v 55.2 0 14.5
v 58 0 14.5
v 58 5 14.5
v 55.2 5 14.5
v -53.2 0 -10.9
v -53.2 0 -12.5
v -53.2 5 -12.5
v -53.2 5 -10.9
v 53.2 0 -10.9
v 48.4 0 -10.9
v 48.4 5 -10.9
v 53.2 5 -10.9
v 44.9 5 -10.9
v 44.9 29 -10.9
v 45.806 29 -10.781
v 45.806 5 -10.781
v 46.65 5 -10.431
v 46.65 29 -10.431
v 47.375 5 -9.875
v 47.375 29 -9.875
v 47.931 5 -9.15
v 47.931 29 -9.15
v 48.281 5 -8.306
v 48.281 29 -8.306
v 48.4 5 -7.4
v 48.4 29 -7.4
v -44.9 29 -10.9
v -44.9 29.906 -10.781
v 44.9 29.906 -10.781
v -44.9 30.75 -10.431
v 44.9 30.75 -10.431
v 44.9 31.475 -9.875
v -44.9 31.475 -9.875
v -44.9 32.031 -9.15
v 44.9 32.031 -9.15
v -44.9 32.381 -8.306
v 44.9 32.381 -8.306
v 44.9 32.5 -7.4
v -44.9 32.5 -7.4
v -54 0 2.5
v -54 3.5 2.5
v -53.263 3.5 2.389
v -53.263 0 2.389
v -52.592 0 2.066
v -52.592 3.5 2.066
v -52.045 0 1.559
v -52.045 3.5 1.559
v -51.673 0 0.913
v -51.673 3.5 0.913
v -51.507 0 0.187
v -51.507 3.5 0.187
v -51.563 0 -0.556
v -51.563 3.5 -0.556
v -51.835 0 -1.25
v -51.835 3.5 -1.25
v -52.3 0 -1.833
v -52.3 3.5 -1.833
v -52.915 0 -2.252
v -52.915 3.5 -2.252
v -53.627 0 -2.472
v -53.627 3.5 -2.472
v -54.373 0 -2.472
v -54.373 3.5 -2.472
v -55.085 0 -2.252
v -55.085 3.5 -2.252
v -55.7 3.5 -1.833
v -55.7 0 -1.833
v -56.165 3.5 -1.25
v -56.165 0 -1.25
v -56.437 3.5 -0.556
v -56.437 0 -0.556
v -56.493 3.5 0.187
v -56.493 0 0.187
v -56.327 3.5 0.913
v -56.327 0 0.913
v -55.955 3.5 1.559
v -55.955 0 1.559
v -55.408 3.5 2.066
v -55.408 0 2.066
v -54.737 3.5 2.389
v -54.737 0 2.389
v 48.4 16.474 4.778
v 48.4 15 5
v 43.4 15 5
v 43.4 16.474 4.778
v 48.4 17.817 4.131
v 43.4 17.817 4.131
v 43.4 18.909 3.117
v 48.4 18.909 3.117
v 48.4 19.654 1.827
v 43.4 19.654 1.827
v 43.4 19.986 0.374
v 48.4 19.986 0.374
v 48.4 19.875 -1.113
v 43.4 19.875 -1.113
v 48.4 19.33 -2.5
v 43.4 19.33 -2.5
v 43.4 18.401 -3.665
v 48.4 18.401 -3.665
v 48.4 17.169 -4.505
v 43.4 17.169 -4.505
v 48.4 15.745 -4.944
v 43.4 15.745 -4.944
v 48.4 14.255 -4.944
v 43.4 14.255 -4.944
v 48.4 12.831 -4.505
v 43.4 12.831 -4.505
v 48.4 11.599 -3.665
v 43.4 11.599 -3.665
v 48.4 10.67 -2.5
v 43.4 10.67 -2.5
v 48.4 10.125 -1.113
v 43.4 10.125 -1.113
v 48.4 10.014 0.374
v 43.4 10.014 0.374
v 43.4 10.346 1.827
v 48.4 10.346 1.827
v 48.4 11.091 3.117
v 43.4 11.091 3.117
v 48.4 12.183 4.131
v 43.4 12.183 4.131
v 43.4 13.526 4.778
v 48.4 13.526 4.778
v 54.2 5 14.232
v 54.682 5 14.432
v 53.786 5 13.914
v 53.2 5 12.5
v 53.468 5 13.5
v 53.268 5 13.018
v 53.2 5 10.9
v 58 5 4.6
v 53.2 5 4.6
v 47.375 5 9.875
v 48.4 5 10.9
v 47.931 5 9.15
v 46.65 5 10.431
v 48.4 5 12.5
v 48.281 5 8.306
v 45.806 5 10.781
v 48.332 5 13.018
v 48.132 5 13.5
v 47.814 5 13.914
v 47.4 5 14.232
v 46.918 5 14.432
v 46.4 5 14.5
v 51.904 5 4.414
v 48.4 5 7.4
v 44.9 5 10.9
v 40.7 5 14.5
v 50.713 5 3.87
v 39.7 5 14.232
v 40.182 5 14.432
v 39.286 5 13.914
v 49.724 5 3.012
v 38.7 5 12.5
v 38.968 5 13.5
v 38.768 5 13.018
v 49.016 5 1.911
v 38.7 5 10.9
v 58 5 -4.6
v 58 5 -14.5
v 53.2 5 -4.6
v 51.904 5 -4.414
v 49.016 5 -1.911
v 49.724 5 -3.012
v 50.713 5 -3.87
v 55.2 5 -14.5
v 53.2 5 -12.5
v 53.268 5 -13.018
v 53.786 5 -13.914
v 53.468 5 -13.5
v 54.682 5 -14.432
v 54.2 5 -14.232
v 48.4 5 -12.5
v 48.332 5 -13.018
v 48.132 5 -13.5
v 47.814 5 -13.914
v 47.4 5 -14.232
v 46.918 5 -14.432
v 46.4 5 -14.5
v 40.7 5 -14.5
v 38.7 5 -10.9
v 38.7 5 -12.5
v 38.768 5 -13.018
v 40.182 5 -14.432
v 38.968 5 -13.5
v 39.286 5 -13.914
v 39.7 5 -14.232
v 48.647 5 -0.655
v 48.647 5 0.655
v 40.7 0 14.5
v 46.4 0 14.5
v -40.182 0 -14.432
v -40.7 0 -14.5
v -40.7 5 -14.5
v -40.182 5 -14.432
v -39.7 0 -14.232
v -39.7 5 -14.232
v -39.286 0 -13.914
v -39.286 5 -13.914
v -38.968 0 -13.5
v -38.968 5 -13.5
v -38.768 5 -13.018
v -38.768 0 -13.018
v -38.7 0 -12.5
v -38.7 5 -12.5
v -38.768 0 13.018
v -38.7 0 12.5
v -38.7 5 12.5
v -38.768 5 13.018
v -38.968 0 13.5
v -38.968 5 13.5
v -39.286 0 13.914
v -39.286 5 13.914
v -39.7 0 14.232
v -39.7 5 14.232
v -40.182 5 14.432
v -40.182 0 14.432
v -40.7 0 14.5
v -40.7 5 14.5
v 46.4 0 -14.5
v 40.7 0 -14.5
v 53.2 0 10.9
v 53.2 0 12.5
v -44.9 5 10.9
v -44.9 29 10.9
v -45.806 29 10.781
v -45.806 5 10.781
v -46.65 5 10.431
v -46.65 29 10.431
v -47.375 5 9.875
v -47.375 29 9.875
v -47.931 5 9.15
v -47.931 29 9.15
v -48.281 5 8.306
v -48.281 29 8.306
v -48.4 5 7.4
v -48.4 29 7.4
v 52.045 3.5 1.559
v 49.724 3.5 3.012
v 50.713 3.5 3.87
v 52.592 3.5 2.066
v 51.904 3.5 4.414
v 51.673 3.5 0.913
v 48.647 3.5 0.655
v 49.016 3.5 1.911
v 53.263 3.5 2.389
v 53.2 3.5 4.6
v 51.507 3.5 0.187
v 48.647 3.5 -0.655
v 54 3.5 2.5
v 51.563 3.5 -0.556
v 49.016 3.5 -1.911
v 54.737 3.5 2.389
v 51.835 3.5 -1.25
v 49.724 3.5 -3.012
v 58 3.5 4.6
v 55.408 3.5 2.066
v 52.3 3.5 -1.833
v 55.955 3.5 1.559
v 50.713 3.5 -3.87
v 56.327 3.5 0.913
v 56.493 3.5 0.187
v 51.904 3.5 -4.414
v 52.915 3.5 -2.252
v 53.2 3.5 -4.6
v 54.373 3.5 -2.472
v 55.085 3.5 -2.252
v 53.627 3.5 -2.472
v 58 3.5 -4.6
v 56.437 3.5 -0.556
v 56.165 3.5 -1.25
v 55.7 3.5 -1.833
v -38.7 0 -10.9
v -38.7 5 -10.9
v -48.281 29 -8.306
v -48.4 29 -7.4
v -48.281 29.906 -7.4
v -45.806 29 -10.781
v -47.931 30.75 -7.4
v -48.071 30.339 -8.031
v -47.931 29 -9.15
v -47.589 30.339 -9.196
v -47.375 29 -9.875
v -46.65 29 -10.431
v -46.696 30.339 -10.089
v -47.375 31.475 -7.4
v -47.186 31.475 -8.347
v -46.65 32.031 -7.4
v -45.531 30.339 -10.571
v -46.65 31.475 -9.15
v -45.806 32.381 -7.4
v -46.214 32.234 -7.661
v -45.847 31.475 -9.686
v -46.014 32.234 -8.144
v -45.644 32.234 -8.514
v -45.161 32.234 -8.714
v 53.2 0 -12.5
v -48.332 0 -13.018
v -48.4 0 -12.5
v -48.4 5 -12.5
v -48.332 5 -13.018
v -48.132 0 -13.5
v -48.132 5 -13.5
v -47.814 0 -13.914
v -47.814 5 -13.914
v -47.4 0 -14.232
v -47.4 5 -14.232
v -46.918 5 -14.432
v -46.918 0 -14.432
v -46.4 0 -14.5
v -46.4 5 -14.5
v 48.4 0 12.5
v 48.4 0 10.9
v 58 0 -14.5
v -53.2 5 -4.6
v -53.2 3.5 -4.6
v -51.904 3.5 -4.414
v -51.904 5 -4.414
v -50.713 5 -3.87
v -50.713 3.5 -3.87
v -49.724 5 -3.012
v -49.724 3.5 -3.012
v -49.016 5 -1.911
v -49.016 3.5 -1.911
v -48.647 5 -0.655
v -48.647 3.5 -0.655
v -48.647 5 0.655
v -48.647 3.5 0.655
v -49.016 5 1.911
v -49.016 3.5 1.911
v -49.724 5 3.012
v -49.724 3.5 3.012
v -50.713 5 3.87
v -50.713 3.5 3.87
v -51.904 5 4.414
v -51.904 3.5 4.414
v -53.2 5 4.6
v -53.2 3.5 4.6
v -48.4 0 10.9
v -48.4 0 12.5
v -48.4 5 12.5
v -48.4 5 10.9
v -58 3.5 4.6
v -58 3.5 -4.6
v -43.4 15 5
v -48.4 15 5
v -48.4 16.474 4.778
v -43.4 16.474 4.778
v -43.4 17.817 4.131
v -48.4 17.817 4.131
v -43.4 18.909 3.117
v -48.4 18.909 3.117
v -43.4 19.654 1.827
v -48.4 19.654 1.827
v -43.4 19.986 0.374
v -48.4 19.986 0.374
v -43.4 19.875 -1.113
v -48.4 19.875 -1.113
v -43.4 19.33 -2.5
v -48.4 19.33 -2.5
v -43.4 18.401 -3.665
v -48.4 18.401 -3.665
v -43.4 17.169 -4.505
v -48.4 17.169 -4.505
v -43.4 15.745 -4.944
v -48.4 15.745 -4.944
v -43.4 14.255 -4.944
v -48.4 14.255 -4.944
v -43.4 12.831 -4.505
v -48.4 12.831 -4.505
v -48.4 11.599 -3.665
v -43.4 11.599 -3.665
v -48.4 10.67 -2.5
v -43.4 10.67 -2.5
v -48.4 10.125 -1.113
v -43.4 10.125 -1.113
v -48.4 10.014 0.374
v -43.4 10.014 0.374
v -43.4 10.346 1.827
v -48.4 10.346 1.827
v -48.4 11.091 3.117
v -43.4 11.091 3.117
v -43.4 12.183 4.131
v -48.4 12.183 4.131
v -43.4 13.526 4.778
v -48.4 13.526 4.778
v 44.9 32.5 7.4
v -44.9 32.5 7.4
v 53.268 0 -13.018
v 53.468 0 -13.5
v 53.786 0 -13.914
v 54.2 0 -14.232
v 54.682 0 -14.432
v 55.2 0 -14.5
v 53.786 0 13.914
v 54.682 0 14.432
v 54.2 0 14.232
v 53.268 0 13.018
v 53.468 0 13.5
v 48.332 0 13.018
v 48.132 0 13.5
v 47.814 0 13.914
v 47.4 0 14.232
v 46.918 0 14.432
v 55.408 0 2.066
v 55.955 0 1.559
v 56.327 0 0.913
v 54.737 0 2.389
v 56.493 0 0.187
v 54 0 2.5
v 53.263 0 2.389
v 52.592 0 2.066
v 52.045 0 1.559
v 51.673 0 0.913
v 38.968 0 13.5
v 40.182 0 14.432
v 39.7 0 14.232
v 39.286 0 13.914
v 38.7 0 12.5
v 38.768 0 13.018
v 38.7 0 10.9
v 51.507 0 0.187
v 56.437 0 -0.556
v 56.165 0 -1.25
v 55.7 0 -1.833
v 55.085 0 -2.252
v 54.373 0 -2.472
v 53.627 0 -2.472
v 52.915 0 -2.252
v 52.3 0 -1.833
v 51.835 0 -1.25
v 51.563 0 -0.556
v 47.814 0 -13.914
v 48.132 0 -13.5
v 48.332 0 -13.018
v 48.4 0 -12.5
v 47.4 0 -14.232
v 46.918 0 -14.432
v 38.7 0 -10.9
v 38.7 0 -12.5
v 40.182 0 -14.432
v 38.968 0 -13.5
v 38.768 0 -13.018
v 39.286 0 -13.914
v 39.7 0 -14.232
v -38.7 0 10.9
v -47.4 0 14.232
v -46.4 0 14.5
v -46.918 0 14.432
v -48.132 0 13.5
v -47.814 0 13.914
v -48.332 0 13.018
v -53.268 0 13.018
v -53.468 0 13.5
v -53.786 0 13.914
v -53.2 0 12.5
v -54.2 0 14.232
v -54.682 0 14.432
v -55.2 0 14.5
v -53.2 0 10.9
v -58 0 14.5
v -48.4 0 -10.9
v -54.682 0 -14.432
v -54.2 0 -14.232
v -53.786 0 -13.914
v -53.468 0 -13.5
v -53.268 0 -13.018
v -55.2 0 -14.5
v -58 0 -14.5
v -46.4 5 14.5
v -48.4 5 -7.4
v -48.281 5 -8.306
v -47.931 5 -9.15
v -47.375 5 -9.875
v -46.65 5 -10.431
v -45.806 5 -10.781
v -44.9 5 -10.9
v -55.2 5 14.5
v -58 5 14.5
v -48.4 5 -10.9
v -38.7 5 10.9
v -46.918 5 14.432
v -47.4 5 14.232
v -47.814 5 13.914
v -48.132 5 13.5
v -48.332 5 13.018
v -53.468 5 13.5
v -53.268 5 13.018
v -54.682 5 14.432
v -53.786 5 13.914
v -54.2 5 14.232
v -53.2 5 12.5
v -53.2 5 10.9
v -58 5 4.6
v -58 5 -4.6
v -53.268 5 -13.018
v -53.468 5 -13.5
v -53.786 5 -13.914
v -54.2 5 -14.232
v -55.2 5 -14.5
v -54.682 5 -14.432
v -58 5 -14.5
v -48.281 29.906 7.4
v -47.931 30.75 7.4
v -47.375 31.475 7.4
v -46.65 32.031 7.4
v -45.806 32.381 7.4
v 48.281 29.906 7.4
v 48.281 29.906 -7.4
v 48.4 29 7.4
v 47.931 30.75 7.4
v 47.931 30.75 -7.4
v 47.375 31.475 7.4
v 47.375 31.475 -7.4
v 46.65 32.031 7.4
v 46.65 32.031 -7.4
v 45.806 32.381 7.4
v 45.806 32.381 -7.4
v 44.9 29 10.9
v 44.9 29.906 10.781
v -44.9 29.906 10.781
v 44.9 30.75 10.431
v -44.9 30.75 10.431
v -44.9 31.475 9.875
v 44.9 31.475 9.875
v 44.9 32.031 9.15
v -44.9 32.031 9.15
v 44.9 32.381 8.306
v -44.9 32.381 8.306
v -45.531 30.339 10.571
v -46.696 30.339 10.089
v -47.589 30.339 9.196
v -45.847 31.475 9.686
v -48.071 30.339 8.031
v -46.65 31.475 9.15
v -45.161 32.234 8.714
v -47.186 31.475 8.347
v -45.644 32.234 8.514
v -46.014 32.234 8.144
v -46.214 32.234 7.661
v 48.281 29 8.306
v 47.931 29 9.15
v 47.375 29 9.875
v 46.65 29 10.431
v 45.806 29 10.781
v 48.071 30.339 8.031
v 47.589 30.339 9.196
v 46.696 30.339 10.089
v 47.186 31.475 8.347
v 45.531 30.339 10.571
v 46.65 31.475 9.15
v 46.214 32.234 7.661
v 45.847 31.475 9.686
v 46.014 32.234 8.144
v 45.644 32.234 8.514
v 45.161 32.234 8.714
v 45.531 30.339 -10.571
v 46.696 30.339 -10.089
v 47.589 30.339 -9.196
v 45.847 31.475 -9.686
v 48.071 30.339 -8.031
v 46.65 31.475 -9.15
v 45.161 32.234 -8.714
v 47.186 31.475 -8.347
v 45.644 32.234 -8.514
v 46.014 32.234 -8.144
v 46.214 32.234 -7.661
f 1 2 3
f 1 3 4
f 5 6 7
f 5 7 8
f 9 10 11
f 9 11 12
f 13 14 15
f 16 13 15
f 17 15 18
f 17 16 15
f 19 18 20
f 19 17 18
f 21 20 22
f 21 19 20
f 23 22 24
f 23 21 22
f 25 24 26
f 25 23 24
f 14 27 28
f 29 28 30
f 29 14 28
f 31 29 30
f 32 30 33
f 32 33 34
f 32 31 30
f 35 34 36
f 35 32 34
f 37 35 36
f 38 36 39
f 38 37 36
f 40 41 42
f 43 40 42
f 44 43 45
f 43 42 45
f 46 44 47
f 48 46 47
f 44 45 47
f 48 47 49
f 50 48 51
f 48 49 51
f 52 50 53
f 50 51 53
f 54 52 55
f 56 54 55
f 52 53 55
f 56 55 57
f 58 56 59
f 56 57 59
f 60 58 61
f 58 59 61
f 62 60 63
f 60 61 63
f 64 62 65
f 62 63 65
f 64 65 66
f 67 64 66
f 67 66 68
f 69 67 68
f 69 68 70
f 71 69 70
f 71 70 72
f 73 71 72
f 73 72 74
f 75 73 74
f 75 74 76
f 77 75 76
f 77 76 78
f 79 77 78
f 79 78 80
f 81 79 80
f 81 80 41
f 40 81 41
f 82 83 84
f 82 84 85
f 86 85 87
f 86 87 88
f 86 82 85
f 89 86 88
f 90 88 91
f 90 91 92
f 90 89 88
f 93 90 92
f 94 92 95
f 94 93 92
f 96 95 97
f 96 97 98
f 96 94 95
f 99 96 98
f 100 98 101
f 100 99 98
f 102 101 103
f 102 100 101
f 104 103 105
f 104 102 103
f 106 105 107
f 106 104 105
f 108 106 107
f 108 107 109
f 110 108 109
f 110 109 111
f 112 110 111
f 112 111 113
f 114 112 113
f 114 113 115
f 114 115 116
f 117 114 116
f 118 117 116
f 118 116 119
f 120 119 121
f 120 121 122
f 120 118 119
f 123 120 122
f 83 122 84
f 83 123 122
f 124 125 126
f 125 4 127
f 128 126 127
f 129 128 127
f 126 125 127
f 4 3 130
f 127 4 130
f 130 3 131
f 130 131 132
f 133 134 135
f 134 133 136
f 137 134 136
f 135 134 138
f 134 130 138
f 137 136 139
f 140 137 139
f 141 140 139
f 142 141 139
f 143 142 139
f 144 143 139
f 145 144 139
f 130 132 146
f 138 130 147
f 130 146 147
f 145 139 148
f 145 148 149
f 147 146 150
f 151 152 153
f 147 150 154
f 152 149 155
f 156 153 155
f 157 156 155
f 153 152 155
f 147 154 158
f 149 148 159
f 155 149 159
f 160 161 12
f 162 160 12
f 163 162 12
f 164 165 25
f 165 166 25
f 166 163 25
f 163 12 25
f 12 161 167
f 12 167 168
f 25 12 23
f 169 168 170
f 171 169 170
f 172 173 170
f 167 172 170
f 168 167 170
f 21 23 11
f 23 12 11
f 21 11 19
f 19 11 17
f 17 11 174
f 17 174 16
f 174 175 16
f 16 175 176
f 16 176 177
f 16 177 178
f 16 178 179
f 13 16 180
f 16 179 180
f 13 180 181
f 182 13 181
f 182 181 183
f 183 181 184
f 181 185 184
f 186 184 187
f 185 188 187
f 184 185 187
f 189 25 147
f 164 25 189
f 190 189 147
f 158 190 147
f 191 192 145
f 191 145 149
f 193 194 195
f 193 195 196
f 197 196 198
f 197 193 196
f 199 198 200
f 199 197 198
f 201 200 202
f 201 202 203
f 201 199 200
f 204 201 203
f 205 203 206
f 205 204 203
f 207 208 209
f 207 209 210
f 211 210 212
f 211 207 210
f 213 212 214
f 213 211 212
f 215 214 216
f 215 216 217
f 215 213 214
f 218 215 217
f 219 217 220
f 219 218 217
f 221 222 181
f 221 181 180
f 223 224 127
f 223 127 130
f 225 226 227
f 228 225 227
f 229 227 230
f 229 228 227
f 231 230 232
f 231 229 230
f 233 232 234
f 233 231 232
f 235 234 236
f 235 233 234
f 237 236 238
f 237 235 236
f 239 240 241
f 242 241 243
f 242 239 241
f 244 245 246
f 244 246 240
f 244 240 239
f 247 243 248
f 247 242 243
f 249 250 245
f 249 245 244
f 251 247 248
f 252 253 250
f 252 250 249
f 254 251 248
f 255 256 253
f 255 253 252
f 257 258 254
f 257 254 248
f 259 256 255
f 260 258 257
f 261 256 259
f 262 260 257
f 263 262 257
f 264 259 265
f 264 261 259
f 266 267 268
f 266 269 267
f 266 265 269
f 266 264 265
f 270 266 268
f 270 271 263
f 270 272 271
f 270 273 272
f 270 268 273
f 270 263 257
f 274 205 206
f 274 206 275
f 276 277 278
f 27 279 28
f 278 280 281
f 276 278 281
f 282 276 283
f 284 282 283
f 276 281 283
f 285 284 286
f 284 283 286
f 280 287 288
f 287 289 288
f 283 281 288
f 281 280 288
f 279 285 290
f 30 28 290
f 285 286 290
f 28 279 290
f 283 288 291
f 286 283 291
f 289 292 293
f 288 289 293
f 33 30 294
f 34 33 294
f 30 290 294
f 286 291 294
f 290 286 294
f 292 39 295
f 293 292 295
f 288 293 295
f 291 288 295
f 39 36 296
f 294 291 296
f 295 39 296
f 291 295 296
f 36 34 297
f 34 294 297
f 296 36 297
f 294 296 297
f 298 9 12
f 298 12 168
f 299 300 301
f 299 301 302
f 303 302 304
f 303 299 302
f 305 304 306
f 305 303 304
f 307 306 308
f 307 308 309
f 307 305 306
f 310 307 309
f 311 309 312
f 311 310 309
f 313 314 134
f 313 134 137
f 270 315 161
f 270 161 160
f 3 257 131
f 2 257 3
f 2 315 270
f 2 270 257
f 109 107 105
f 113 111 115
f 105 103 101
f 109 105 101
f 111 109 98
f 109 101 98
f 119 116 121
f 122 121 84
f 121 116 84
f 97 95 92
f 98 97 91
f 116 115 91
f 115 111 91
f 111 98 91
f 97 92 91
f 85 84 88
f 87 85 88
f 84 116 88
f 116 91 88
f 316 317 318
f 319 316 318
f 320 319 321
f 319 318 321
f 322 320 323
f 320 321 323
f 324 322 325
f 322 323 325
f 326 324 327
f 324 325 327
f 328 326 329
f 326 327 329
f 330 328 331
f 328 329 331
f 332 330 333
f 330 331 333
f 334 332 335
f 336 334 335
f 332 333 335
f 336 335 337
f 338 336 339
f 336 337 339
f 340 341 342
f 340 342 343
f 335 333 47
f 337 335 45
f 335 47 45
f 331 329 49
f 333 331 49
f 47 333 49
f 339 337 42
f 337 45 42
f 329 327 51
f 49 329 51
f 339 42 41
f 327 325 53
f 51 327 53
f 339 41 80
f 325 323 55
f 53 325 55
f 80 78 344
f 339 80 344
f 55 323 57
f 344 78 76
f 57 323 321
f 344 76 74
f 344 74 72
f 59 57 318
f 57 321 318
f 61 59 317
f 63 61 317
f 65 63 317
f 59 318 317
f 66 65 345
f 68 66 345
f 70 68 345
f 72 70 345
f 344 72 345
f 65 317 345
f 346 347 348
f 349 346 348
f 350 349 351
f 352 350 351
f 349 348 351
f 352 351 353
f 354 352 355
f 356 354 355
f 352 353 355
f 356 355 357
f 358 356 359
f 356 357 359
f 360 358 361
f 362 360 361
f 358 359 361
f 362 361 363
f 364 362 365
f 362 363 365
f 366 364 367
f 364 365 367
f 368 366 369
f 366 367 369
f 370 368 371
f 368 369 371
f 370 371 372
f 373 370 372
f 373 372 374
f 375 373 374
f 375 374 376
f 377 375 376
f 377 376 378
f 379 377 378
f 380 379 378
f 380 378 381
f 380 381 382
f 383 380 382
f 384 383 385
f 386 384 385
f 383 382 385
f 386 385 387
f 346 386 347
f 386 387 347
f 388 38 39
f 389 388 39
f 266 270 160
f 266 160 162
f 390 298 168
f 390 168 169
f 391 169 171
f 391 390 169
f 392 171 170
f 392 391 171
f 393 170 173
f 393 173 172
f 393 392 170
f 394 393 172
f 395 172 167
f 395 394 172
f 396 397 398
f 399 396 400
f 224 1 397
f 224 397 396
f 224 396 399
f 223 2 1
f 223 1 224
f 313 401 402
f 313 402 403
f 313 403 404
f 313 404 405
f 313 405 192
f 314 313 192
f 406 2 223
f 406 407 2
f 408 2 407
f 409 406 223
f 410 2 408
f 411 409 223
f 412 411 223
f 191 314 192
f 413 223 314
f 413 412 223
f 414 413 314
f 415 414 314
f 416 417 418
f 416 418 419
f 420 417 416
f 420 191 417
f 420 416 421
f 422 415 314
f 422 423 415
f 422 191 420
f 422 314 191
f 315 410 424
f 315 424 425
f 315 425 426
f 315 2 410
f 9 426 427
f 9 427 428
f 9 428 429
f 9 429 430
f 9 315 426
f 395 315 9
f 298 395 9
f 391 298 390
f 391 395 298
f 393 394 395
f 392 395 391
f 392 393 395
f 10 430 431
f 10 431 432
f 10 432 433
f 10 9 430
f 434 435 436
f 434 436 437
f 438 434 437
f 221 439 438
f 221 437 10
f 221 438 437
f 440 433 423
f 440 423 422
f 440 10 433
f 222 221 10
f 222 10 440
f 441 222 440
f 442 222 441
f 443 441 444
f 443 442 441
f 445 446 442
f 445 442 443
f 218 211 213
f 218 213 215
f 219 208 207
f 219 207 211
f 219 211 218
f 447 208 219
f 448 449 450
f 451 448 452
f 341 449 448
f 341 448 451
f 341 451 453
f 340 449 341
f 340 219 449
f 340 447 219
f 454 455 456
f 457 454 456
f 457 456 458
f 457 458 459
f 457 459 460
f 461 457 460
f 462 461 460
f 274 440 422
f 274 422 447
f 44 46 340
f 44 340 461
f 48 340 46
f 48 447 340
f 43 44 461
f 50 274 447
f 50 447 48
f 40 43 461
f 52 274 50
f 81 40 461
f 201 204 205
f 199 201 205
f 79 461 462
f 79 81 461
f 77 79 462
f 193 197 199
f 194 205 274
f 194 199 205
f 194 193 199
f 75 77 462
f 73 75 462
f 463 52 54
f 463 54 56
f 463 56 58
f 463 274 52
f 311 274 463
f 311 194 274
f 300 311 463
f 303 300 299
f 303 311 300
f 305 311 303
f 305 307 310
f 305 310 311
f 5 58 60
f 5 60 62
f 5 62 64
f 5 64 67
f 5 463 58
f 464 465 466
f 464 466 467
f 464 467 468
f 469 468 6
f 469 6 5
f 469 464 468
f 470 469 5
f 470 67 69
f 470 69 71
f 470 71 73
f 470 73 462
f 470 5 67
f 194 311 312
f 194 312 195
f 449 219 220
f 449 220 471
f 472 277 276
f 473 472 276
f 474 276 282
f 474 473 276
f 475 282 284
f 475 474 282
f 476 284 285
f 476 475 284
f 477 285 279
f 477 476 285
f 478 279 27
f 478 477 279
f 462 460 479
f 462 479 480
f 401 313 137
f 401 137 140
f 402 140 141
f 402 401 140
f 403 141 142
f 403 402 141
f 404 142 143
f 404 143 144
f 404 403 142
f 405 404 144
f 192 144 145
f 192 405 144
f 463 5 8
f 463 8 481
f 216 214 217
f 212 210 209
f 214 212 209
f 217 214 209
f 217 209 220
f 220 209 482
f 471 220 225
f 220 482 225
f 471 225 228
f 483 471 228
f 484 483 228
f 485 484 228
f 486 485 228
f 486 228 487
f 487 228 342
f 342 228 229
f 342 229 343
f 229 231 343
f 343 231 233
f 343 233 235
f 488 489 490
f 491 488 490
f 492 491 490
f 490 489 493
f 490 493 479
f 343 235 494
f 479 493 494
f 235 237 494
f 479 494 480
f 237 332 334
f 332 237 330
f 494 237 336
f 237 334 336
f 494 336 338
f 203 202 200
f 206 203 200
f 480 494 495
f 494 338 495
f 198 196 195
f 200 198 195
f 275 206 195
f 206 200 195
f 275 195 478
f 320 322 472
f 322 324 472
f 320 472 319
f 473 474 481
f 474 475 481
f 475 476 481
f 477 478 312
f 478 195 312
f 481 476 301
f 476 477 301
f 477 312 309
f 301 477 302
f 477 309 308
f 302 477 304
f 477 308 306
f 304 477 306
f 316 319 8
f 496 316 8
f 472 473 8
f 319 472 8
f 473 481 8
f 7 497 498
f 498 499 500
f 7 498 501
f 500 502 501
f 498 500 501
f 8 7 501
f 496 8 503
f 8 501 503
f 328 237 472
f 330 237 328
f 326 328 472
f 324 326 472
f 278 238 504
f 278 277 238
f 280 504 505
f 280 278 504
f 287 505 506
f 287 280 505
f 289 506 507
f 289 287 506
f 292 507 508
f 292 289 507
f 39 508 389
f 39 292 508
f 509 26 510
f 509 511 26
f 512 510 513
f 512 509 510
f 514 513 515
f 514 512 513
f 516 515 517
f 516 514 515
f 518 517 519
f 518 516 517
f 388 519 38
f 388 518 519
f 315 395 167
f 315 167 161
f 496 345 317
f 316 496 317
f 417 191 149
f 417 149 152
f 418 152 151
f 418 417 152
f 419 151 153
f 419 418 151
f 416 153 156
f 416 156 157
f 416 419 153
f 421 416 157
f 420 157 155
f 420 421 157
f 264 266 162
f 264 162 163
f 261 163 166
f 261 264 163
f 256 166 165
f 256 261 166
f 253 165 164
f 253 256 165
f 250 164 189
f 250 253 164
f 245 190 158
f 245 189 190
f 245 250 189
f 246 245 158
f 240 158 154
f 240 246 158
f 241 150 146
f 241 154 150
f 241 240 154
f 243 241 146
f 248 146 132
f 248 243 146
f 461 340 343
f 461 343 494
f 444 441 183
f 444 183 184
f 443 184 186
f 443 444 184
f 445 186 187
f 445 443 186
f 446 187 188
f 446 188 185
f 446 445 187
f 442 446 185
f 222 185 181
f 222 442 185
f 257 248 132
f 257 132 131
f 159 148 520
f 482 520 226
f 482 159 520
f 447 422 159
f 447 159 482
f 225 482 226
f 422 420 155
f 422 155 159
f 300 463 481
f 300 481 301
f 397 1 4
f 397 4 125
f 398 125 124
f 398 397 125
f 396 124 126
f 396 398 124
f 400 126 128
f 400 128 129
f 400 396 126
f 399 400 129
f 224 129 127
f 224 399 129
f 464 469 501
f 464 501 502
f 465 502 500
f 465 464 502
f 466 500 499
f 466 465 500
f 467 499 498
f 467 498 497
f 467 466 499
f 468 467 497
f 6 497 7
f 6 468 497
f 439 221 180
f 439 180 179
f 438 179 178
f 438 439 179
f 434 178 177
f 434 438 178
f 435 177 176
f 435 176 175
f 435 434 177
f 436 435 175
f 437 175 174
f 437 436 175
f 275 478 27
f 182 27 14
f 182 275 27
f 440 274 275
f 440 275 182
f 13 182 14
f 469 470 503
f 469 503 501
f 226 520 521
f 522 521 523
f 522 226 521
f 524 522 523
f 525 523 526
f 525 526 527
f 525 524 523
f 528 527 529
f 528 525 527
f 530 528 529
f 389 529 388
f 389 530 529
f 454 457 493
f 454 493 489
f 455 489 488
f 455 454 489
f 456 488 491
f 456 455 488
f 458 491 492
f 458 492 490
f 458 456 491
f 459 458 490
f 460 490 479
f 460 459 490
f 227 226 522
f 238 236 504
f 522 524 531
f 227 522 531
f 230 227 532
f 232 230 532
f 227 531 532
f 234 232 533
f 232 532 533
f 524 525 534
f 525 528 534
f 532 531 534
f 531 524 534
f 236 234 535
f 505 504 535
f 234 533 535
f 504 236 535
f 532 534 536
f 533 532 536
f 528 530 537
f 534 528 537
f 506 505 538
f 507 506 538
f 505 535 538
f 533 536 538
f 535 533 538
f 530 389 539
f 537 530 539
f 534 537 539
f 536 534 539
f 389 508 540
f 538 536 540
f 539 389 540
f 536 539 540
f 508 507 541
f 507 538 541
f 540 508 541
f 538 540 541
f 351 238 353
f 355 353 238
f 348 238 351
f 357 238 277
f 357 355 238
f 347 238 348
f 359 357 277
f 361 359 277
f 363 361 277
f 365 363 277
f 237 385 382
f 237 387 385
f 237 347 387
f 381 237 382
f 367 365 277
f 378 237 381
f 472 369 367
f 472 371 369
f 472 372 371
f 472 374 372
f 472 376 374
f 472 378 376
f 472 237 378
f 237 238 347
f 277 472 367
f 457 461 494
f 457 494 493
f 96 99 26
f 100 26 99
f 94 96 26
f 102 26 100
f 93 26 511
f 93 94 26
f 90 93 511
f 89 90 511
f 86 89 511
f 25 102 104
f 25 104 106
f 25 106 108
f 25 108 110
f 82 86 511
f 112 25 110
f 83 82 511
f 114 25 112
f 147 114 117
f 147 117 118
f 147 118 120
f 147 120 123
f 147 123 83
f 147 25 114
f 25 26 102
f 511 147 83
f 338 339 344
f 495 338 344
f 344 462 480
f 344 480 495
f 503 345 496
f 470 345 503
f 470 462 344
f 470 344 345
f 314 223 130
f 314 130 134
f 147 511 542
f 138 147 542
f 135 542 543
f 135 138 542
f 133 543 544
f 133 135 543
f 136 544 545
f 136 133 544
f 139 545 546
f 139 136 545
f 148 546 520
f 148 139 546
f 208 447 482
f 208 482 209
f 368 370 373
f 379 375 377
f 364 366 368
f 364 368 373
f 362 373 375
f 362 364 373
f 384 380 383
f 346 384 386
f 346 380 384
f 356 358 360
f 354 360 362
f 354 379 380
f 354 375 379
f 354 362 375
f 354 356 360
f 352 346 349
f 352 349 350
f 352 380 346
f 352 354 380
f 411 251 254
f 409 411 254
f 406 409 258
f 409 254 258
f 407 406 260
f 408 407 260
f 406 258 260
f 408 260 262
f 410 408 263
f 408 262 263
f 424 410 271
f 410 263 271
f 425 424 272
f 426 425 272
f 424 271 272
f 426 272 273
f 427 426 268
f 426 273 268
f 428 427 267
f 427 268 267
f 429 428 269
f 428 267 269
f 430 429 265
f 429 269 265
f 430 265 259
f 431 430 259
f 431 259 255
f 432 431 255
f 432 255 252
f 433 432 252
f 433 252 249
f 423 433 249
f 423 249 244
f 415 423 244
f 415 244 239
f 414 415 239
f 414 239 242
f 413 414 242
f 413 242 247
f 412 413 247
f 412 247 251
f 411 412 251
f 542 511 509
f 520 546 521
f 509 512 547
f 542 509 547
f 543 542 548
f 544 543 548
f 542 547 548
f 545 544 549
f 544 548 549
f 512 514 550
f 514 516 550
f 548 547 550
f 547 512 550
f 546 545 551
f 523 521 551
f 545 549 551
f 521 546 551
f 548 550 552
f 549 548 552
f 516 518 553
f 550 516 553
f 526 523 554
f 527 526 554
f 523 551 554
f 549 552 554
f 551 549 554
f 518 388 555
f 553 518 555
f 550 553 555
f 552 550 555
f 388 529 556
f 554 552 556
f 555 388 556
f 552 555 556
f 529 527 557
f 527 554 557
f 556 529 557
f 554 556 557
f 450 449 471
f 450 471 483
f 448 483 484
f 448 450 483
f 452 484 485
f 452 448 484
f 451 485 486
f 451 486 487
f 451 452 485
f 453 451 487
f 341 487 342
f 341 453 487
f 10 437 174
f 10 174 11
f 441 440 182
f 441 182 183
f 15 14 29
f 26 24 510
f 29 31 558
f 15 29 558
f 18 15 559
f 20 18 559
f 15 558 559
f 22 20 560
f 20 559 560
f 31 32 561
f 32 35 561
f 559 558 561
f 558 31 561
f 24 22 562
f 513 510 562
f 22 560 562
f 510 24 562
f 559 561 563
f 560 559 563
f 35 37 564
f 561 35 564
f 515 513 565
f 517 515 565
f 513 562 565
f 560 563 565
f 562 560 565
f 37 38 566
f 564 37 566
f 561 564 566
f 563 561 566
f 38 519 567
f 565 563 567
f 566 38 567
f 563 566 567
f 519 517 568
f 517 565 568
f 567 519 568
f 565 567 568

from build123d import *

# Parameters (mm, degrees)
EXTRUDE_2_DEPTH          = 5
EXTRUDE_3_DEPTH          = 27.5
FILLET_1_R               = 3.5
SKETCH_4_R               = 5
CUT_EXTRUDE_1_DEPTH      = 5
CUT_EXTRUDE_2_DEPTH      = 66.80653463
CUT_EXTRUDE_2_DEPTH_BACK = 1.5
SKETCH_6_R               = 2.5
CUT_EXTRUDE_3_DEPTH      = 10


with BuildPart() as part:
    # ｽｹｯﾁ1 → ﾎﾞｽ - 押し出し2 (new body)
    with BuildSketch(Plane(origin=(0, 0, 0), x_dir=(1, 0, 0), z_dir=(0, 1, 0))):
        with BuildLine():
            Line((-58, -14.5), (-58, 14.5))
            Line((-58, 14.5), (-55.2, 14.5))
            ThreePointArc((-55.2, 14.5), (-53.785786438, 13.914213562), (-53.2, 12.5))
            Line((-53.2, 12.5), (-53.2, 10.9))
            Line((-53.2, 10.9), (-48.4, 10.9))
            Line((-48.4, 10.9), (-48.4, 12.5))
            ThreePointArc((-48.4, 12.5), (-47.814213562, 13.914213562), (-46.4, 14.5))
            Line((-46.4, 14.5), (-40.7, 14.5))
            ThreePointArc((-40.7, 14.5), (-39.285786438, 13.914213562), (-38.7, 12.5))
            Line((-38.7, 12.5), (-38.7, 10.9))
            Line((-38.7, 10.9), (38.7, 10.9))
            Line((38.7, 10.9), (38.7, 12.5))
            ThreePointArc((38.7, 12.5), (39.285786438, 13.914213562), (40.7, 14.5))
            Line((40.7, 14.5), (46.4, 14.5))
            ThreePointArc((46.4, 14.5), (47.814213562, 13.914213562), (48.4, 12.5))
            Line((48.4, 12.5), (48.4, 10.9))
            Line((48.4, 10.9), (53.2, 10.9))
            Line((53.2, 10.9), (53.2, 12.5))
            ThreePointArc((53.2, 12.5), (53.785786438, 13.914213562), (55.2, 14.5))
            Line((55.2, 14.5), (58, 14.5))
            Line((58, 14.5), (58, -14.5))
            Line((58, -14.5), (55.2, -14.5))
            ThreePointArc((55.2, -14.5), (53.785786438, -13.914213562), (53.2, -12.5))
            Line((53.2, -12.5), (53.2, -10.9))
            Line((53.2, -10.9), (48.4, -10.9))
            Line((48.4, -10.9), (48.4, -12.5))
            ThreePointArc((48.4, -12.5), (47.814213562, -13.914213562), (46.4, -14.5))
            Line((46.4, -14.5), (40.7, -14.5))
            ThreePointArc((40.7, -14.5), (39.285786438, -13.914213562), (38.7, -12.5))
            Line((38.7, -12.5), (38.7, -10.9))
            Line((38.7, -10.9), (-38.7, -10.9))
            Line((-38.7, -10.9), (-38.7, -12.5))
            ThreePointArc((-38.7, -12.5), (-39.285786438, -13.914213562), (-40.7, -14.5))
            Line((-40.7, -14.5), (-46.4, -14.5))
            ThreePointArc((-46.4, -14.5), (-47.814213562, -13.914213562), (-48.4, -12.5))
            Line((-48.4, -12.5), (-48.4, -10.9))
            Line((-48.4, -10.9), (-53.2, -10.9))
            Line((-53.2, -10.9), (-53.2, -12.5))
            ThreePointArc((-53.2, -12.5), (-53.785786438, -13.914213562), (-55.2, -14.5))
            Line((-55.2, -14.5), (-58, -14.5))
        make_face()
    extrude(amount=EXTRUDE_2_DEPTH)

    # ｽｹｯﾁ3 → ﾎﾞｽ - 押し出し3 (add)
    with BuildSketch(Plane(origin=(0, 5, 0), x_dir=(1, 0, 0), z_dir=(0, 1, 0))):
        with BuildLine():
            Line((-44.9, 10.9), (44.9, 10.9))
            ThreePointArc((44.9, 10.9), (47.374873734, 9.874873734), (48.4, 7.4))
            Line((48.4, 7.4), (48.4, -7.4))
            ThreePointArc((48.4, -7.4), (47.374873734, -9.874873734), (44.9, -10.9))
            Line((44.9, -10.9), (-44.9, -10.9))
            ThreePointArc((-44.9, -10.9), (-47.374873734, -9.874873734), (-48.4, -7.4))
            Line((-48.4, -7.4), (-48.4, 7.4))
            ThreePointArc((-48.4, 7.4), (-47.374873734, 9.874873734), (-44.9, 10.9))
        make_face()
    extrude(amount=EXTRUDE_3_DEPTH)

    # ﾌｨﾚｯﾄ1
    fillet_1_edges = [part.edges().sort_by_distance(p)[0] for p in [
        (47.374873734, 32.5, -9.874873734),
        (0, 32.5, -10.9),
        (-47.374873734, 32.5, -9.874873734),
        (-48.4, 32.5, 0),
        (-47.374873734, 32.5, 9.874873734),
        (0, 32.5, 10.9),
        (47.374873734, 32.5, 9.874873734),
        (48.4, 32.5, 0),
    ]]
    fillet(fillet_1_edges, radius=FILLET_1_R)

    # ｽｹｯﾁ4 → ｶｯﾄ - 押し出し1 (cut)
    with BuildSketch(Plane.ZY.offset(48.4)):
        with Locations((0, 15)):
            Circle(SKETCH_4_R)
    cut_extrude_1 = extrude(amount=-CUT_EXTRUDE_1_DEPTH, mode=Mode.SUBTRACT)

    # ﾐﾗｰ1: ｶｯﾄ - 押し出し1 across plane
    add(cut_extrude_1.mirror(Plane(origin=(0, 0, 0), x_dir=(0, 0, 1), z_dir=(1, 0, 0))), mode=Mode.SUBTRACT)

    # ｽｹｯﾁ5 → ｶｯﾄ - 押し出し2 (cut, two sides: drawn at the far end of the back side and taken through both)
    with BuildSketch(Plane(origin=(0, 5, 0), x_dir=(1, 0, 0), z_dir=(0, 1, 0)).offset(-CUT_EXTRUDE_2_DEPTH_BACK)):
        with BuildLine():
            Line((-53.2, -4.6), (-58, -4.6))
            Line((-58, -4.6), (-58, 4.6))
            Line((-58, 4.6), (-53.2, 4.6))
            ThreePointArc((-53.2, 4.6), (-48.6, 0), (-53.2, -4.6))
        make_face()
        with BuildLine():
            Line((58, -4.6), (58, 4.6))
            Line((58, 4.6), (53.2, 4.6))
            ThreePointArc((53.2, 4.6), (48.6, 0), (53.2, -4.6))
            Line((53.2, -4.6), (58, -4.6))
        make_face()
    extrude(amount=CUT_EXTRUDE_2_DEPTH + CUT_EXTRUDE_2_DEPTH_BACK, mode=Mode.SUBTRACT)

    # ｽｹｯﾁ6 → ｶｯﾄ - 押し出し3 (cut)
    with BuildSketch(Plane(origin=(0, 3.5, 0), x_dir=(1, 0, 0), z_dir=(0, 1, 0))):
        with Locations(Location((-54, 0, 0), (0, 0, 270))):
            Circle(SKETCH_6_R)
        with Locations(Location((54, 0, 0), (0, 0, 270))):
            Circle(SKETCH_6_R)
    extrude(amount=-CUT_EXTRUDE_3_DEPTH, mode=Mode.SUBTRACT)


solid = part.part
